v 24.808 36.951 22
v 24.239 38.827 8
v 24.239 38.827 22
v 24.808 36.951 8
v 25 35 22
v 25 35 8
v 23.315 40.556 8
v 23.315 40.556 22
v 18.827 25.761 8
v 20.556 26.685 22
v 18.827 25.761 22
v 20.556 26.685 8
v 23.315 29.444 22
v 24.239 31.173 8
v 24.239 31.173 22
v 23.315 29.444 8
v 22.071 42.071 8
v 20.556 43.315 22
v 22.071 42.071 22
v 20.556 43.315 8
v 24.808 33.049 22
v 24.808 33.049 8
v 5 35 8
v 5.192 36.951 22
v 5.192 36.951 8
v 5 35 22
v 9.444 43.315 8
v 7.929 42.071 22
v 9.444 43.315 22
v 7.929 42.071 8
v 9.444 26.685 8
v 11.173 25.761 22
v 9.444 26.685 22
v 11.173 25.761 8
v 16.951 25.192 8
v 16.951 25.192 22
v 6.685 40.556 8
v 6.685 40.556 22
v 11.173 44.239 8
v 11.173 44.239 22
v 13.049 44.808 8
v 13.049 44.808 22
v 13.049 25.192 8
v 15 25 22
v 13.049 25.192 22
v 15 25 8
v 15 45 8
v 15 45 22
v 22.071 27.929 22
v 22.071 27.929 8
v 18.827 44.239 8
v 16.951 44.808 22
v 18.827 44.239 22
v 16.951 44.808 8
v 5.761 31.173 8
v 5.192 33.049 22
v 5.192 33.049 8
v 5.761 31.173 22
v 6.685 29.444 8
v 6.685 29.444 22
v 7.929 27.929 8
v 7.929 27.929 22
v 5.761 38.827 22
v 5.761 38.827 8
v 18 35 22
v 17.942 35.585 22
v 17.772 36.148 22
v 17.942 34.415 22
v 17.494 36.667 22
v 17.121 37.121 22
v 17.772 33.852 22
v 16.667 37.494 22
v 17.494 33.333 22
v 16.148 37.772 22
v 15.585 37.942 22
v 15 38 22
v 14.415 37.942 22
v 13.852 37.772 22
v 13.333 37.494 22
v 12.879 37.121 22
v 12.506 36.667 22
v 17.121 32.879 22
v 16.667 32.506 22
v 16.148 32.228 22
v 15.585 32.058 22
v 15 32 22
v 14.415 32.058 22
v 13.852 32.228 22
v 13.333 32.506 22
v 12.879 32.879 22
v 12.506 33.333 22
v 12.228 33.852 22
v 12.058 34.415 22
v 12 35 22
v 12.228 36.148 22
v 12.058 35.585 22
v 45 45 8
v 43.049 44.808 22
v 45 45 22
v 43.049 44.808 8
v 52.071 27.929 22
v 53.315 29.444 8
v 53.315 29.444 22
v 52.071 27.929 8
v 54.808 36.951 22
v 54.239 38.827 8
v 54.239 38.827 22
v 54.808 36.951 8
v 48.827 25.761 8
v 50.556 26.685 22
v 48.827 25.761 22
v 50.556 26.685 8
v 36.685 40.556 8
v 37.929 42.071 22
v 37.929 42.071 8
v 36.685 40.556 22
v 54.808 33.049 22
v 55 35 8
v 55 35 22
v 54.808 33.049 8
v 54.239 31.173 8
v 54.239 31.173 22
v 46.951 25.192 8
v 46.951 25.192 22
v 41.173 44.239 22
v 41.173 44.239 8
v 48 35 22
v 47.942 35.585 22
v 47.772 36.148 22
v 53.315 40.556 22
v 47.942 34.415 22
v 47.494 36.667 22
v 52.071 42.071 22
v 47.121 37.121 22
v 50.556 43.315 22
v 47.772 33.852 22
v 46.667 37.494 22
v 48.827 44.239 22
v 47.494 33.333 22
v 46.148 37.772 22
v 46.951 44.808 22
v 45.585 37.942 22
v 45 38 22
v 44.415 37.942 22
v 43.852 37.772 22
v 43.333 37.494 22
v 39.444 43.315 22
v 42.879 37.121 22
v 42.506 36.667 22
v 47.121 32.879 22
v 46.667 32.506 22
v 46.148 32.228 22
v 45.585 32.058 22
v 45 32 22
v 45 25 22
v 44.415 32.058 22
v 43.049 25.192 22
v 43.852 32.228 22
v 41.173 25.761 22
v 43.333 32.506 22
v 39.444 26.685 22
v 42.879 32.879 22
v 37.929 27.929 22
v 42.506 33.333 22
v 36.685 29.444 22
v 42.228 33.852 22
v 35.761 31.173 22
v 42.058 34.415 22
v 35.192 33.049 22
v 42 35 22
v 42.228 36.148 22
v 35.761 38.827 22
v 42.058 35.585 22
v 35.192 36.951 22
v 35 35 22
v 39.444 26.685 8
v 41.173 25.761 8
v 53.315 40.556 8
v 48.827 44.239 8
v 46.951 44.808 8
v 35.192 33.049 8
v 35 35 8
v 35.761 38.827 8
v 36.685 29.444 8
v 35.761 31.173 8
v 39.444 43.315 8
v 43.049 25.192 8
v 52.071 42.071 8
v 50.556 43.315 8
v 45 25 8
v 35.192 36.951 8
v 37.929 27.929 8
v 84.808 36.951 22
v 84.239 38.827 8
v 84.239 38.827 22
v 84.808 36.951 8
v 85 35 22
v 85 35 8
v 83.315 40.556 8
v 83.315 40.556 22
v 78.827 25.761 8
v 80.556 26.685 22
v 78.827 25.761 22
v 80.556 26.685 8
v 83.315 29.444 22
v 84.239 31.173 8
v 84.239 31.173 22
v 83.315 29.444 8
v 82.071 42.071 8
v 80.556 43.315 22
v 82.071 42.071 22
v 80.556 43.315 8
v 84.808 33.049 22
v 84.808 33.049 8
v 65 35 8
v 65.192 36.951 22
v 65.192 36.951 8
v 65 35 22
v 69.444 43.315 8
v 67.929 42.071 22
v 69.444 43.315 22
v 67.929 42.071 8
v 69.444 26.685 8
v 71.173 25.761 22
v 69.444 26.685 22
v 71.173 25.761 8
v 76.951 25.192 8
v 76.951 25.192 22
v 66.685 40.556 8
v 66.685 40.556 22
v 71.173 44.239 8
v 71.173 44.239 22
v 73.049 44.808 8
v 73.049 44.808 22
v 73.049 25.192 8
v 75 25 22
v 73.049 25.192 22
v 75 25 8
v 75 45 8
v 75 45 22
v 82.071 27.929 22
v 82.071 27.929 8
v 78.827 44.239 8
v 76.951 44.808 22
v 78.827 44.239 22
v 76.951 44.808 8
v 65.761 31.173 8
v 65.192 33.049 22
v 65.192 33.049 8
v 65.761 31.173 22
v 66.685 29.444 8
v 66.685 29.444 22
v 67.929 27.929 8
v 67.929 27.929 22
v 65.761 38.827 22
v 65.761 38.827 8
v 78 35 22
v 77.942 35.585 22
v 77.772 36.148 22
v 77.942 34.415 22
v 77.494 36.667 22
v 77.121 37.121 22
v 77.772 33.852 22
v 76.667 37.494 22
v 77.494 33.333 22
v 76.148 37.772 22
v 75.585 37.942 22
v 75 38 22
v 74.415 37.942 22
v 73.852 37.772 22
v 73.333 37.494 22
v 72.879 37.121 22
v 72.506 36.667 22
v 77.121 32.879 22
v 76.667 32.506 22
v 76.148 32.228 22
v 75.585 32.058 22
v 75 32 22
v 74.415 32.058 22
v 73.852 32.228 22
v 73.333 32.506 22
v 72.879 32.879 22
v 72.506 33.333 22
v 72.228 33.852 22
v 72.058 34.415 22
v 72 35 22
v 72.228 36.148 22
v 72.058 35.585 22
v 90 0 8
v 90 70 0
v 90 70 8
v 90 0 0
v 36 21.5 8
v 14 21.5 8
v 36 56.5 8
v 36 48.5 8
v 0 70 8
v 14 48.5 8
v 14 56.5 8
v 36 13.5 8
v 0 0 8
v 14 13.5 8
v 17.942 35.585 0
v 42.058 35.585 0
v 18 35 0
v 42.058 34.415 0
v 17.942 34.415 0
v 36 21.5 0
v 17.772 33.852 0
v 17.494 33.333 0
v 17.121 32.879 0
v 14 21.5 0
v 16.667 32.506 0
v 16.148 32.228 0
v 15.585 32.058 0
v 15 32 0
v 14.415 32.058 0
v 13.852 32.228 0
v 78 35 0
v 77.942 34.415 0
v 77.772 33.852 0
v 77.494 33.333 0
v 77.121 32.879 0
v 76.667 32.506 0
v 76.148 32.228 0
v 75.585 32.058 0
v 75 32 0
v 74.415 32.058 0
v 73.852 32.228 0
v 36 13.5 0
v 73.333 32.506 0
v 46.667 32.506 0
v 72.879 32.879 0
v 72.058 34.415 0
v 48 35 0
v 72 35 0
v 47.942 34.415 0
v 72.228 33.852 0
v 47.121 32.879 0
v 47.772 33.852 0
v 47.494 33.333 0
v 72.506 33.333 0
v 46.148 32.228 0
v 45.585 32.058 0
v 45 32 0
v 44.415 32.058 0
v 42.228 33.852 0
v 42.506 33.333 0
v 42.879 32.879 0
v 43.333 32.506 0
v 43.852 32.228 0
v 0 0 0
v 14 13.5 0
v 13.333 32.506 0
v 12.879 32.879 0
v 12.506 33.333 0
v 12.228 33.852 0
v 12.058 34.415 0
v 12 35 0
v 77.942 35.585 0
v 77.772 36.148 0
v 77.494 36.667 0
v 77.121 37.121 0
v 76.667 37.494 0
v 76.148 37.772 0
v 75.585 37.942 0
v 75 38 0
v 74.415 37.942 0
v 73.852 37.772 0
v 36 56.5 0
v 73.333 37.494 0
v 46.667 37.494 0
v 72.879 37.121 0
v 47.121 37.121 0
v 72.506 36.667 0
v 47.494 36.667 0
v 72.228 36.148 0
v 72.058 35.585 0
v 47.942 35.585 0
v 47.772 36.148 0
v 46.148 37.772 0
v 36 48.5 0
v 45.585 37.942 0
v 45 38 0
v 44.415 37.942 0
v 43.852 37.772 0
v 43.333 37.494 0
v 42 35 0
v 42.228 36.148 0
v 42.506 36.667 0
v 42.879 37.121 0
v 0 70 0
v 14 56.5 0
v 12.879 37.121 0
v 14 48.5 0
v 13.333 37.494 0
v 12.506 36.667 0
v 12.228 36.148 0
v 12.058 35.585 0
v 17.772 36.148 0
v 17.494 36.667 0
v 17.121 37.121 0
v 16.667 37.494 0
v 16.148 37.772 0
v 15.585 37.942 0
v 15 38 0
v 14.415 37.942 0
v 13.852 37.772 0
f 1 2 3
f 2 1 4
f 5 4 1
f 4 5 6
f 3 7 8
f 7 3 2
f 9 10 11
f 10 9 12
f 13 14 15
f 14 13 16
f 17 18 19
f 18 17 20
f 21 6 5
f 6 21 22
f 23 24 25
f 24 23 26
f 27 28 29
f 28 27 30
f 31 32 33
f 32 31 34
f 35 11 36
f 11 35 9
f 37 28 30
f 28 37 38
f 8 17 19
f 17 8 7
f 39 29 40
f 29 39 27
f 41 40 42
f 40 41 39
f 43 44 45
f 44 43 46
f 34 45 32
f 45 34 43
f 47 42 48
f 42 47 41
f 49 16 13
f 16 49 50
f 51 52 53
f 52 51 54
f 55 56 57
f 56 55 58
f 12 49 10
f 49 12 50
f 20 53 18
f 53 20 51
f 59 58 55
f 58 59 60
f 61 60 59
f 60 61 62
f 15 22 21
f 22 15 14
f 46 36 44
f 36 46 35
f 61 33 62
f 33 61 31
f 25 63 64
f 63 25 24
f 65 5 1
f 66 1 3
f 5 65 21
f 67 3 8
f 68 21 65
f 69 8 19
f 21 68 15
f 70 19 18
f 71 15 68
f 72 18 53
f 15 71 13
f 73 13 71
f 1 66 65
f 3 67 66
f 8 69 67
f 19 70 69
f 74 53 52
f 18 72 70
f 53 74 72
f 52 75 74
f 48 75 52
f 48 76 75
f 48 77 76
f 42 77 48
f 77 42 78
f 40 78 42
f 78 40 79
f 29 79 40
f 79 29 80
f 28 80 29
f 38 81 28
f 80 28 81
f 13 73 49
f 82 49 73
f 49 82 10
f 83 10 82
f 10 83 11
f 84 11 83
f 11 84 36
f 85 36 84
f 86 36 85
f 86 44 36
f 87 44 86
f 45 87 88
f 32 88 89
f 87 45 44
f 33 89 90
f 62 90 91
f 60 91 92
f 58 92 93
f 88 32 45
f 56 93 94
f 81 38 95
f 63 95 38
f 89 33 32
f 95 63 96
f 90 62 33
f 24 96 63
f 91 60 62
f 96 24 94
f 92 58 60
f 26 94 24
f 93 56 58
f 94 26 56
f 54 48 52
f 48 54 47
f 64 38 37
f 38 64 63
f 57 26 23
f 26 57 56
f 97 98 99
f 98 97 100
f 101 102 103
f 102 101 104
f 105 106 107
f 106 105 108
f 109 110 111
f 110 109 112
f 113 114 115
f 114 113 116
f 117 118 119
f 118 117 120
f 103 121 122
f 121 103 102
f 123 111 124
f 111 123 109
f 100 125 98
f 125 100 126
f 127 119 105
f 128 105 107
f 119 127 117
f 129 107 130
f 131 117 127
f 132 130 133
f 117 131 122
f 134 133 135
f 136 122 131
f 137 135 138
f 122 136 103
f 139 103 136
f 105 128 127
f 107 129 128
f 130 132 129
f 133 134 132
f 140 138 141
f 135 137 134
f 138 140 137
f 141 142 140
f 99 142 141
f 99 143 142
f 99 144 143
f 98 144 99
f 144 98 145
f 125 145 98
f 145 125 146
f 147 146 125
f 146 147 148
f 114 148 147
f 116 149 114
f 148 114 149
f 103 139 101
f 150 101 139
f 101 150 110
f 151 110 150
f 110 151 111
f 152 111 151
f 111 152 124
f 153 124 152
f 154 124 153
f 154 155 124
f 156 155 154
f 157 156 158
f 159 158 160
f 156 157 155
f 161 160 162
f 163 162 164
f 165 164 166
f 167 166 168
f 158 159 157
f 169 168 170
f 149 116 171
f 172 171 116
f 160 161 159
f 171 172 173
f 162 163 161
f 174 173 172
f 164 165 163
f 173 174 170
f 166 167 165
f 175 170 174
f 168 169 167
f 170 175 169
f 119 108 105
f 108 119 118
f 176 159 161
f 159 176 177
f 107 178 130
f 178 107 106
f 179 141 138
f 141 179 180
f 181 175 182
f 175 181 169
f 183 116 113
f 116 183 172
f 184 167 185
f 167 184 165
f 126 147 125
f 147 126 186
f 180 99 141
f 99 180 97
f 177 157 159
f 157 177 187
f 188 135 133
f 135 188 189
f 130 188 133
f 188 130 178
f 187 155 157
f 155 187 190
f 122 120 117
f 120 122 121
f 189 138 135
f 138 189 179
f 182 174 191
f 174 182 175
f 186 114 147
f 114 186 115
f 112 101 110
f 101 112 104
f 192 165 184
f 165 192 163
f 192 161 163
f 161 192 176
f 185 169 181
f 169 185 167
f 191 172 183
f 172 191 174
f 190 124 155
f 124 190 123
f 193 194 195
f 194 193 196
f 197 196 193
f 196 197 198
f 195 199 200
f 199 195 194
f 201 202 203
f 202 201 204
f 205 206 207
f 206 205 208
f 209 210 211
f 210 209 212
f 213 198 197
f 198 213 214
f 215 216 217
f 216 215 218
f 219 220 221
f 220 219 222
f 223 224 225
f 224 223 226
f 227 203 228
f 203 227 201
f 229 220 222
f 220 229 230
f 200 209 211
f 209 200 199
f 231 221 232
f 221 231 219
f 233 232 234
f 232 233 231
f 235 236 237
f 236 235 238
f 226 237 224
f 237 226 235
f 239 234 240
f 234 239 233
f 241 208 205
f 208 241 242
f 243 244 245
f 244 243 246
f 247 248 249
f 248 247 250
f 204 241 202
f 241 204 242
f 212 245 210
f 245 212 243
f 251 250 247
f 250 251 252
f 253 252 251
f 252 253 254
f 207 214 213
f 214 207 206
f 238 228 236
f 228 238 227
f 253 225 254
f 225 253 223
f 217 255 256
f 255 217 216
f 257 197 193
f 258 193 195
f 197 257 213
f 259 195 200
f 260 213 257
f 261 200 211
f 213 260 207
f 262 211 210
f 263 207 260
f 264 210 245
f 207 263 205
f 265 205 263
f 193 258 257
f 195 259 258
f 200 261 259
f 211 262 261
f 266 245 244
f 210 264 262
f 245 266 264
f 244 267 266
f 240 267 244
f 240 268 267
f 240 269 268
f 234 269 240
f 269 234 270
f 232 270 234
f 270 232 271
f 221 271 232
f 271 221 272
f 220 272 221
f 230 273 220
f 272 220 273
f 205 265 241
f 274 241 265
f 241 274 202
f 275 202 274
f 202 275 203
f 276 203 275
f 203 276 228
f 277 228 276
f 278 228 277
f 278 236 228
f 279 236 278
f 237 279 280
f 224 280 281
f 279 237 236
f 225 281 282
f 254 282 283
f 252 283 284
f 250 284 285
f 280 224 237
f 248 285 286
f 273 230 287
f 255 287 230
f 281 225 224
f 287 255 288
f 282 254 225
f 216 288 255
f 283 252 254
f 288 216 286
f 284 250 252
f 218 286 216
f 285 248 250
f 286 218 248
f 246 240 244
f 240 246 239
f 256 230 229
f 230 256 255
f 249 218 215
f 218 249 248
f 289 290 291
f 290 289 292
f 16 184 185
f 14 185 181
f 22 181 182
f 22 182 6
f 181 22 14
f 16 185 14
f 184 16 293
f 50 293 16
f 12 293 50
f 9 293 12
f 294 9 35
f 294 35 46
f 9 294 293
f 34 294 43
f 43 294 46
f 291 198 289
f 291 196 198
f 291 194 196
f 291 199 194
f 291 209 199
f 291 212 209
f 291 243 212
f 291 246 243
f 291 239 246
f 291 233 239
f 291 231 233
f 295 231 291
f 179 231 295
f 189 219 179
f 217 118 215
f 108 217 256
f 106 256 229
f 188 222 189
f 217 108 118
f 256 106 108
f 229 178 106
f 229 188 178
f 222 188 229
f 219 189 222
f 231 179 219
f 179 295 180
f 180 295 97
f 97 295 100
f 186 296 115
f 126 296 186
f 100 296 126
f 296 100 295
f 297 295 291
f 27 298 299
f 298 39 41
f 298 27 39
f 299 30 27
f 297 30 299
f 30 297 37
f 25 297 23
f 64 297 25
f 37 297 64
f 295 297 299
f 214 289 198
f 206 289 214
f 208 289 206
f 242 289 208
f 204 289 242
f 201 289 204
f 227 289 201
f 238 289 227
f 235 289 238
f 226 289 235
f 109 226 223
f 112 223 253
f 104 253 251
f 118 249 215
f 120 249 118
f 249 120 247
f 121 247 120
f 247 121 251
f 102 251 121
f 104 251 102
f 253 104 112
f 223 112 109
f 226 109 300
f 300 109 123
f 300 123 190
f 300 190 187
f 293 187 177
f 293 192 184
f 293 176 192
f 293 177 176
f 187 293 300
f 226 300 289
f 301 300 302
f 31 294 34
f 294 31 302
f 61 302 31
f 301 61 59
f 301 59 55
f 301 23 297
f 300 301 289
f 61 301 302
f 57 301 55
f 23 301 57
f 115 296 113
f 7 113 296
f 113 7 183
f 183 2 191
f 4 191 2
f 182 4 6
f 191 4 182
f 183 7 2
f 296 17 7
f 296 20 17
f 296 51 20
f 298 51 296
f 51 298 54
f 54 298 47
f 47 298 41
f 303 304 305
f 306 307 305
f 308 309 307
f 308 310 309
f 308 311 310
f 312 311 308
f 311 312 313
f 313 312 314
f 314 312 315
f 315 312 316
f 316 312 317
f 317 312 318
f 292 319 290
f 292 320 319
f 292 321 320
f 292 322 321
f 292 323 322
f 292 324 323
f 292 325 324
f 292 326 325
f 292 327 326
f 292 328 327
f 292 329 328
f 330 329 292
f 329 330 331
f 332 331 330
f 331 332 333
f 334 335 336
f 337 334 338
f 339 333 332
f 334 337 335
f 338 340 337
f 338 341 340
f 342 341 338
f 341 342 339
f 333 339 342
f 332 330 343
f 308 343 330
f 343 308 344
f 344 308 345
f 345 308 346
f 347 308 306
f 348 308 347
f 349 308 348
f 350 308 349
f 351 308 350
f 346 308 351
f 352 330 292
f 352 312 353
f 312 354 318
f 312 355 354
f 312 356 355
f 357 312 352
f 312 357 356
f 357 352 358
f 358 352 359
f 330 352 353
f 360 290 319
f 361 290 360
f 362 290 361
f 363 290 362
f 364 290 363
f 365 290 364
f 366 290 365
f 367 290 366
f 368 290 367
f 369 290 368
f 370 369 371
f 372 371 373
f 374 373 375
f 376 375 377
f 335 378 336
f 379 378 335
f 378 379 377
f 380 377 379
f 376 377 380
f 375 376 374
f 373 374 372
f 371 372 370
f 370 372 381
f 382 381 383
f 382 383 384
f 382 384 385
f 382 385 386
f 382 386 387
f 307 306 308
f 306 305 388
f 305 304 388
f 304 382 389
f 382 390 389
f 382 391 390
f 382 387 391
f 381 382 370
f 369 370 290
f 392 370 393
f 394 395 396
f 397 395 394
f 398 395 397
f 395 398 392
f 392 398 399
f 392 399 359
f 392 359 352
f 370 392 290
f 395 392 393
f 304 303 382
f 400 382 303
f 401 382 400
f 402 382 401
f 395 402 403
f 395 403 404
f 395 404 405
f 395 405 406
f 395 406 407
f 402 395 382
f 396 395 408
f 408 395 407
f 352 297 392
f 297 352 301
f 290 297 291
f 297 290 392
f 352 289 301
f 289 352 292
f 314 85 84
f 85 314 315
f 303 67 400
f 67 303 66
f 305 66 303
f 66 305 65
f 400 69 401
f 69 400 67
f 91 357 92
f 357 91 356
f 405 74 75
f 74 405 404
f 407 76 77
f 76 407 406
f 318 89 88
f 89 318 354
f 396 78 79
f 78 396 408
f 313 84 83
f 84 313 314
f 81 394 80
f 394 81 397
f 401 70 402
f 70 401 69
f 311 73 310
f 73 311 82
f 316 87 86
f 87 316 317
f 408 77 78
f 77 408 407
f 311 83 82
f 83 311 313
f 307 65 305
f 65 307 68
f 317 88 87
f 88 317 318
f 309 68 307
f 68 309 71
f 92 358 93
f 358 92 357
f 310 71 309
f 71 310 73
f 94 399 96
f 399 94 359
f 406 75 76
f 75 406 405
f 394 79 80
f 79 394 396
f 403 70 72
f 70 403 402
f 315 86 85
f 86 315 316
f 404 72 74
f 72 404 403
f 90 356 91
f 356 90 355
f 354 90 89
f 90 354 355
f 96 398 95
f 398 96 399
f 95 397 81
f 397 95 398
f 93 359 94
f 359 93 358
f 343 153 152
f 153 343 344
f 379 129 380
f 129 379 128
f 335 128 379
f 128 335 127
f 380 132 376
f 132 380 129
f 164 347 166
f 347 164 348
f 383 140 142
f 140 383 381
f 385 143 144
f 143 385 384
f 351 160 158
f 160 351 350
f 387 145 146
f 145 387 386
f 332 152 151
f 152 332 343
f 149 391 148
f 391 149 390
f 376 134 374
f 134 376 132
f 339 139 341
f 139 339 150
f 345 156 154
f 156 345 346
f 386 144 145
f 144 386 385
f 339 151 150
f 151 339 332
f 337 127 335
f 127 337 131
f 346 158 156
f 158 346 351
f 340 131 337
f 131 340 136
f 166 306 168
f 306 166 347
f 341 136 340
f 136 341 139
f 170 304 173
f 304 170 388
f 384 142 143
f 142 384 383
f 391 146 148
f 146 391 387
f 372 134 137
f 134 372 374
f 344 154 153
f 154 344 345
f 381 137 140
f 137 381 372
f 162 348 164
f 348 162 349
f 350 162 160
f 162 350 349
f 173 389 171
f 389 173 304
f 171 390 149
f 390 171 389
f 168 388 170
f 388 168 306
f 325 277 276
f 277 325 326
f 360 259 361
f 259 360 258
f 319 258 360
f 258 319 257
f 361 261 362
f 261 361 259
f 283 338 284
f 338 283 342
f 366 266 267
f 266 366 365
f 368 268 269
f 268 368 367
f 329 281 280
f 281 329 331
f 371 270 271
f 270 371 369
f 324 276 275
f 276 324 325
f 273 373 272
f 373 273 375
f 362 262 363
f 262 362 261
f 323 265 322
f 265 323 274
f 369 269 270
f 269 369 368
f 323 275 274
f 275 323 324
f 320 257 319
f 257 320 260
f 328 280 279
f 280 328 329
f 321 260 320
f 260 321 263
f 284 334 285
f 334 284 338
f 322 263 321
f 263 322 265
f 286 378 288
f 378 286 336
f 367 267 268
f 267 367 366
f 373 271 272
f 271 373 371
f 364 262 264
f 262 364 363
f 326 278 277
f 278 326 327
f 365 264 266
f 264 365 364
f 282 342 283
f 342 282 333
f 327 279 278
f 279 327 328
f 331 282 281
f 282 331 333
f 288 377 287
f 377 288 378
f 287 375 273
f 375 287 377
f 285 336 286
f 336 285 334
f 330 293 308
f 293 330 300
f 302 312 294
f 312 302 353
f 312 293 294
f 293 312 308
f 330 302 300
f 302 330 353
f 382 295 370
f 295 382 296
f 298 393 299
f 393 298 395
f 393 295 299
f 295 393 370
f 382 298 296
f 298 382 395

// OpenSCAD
$fn = 32;

// ----------------------------------------------------------------------
// Drill jig: three_boss_slot jig
// ----------------------------------------------------------------------

// --- parameters (mm) ---
plate_l = 90;             // plate length, X
plate_w = 70;             // plate width, Y
plate_t = 8;              // plate thickness
boss_d = 20;              // guide boss diameter
boss_h = 15;              // boss height above the plate
guide_d = 6;              // guide hole diameter
boss_pitch = 30;          // boss pitch
slot_w = 8;               // clamp slot width
slot_l = 22;              // clamp slot length
slot_x = 14;              // slot start X

n_boss = 3;  // guide bosses
boss_x0 = (plate_l - (n_boss - 1) * boss_pitch) / 2;  // first boss X
boss_top = plate_t - 1 + boss_h;  // boss crown height
total_h = boss_top;  // overall height

difference() {
  union() {
  cube([plate_l, plate_w, plate_t]);
  for (i = [0 : n_boss - 1])
    translate([boss_x0 + i * boss_pitch, plate_w / 2, plate_t - 1])
      cylinder(h = boss_h, d = boss_d);
  }
  for (i = [0 : n_boss - 1])
    translate([boss_x0 + i * boss_pitch, plate_w / 2, -1])
      cylinder(h = plate_t + boss_h, d = guide_d);
  for (cy = [plate_w * 0.25, plate_w * 0.75])
    translate([slot_x, cy - slot_w / 2, -1])
      cube([slot_l, slot_w, plate_t + 2]);
}
